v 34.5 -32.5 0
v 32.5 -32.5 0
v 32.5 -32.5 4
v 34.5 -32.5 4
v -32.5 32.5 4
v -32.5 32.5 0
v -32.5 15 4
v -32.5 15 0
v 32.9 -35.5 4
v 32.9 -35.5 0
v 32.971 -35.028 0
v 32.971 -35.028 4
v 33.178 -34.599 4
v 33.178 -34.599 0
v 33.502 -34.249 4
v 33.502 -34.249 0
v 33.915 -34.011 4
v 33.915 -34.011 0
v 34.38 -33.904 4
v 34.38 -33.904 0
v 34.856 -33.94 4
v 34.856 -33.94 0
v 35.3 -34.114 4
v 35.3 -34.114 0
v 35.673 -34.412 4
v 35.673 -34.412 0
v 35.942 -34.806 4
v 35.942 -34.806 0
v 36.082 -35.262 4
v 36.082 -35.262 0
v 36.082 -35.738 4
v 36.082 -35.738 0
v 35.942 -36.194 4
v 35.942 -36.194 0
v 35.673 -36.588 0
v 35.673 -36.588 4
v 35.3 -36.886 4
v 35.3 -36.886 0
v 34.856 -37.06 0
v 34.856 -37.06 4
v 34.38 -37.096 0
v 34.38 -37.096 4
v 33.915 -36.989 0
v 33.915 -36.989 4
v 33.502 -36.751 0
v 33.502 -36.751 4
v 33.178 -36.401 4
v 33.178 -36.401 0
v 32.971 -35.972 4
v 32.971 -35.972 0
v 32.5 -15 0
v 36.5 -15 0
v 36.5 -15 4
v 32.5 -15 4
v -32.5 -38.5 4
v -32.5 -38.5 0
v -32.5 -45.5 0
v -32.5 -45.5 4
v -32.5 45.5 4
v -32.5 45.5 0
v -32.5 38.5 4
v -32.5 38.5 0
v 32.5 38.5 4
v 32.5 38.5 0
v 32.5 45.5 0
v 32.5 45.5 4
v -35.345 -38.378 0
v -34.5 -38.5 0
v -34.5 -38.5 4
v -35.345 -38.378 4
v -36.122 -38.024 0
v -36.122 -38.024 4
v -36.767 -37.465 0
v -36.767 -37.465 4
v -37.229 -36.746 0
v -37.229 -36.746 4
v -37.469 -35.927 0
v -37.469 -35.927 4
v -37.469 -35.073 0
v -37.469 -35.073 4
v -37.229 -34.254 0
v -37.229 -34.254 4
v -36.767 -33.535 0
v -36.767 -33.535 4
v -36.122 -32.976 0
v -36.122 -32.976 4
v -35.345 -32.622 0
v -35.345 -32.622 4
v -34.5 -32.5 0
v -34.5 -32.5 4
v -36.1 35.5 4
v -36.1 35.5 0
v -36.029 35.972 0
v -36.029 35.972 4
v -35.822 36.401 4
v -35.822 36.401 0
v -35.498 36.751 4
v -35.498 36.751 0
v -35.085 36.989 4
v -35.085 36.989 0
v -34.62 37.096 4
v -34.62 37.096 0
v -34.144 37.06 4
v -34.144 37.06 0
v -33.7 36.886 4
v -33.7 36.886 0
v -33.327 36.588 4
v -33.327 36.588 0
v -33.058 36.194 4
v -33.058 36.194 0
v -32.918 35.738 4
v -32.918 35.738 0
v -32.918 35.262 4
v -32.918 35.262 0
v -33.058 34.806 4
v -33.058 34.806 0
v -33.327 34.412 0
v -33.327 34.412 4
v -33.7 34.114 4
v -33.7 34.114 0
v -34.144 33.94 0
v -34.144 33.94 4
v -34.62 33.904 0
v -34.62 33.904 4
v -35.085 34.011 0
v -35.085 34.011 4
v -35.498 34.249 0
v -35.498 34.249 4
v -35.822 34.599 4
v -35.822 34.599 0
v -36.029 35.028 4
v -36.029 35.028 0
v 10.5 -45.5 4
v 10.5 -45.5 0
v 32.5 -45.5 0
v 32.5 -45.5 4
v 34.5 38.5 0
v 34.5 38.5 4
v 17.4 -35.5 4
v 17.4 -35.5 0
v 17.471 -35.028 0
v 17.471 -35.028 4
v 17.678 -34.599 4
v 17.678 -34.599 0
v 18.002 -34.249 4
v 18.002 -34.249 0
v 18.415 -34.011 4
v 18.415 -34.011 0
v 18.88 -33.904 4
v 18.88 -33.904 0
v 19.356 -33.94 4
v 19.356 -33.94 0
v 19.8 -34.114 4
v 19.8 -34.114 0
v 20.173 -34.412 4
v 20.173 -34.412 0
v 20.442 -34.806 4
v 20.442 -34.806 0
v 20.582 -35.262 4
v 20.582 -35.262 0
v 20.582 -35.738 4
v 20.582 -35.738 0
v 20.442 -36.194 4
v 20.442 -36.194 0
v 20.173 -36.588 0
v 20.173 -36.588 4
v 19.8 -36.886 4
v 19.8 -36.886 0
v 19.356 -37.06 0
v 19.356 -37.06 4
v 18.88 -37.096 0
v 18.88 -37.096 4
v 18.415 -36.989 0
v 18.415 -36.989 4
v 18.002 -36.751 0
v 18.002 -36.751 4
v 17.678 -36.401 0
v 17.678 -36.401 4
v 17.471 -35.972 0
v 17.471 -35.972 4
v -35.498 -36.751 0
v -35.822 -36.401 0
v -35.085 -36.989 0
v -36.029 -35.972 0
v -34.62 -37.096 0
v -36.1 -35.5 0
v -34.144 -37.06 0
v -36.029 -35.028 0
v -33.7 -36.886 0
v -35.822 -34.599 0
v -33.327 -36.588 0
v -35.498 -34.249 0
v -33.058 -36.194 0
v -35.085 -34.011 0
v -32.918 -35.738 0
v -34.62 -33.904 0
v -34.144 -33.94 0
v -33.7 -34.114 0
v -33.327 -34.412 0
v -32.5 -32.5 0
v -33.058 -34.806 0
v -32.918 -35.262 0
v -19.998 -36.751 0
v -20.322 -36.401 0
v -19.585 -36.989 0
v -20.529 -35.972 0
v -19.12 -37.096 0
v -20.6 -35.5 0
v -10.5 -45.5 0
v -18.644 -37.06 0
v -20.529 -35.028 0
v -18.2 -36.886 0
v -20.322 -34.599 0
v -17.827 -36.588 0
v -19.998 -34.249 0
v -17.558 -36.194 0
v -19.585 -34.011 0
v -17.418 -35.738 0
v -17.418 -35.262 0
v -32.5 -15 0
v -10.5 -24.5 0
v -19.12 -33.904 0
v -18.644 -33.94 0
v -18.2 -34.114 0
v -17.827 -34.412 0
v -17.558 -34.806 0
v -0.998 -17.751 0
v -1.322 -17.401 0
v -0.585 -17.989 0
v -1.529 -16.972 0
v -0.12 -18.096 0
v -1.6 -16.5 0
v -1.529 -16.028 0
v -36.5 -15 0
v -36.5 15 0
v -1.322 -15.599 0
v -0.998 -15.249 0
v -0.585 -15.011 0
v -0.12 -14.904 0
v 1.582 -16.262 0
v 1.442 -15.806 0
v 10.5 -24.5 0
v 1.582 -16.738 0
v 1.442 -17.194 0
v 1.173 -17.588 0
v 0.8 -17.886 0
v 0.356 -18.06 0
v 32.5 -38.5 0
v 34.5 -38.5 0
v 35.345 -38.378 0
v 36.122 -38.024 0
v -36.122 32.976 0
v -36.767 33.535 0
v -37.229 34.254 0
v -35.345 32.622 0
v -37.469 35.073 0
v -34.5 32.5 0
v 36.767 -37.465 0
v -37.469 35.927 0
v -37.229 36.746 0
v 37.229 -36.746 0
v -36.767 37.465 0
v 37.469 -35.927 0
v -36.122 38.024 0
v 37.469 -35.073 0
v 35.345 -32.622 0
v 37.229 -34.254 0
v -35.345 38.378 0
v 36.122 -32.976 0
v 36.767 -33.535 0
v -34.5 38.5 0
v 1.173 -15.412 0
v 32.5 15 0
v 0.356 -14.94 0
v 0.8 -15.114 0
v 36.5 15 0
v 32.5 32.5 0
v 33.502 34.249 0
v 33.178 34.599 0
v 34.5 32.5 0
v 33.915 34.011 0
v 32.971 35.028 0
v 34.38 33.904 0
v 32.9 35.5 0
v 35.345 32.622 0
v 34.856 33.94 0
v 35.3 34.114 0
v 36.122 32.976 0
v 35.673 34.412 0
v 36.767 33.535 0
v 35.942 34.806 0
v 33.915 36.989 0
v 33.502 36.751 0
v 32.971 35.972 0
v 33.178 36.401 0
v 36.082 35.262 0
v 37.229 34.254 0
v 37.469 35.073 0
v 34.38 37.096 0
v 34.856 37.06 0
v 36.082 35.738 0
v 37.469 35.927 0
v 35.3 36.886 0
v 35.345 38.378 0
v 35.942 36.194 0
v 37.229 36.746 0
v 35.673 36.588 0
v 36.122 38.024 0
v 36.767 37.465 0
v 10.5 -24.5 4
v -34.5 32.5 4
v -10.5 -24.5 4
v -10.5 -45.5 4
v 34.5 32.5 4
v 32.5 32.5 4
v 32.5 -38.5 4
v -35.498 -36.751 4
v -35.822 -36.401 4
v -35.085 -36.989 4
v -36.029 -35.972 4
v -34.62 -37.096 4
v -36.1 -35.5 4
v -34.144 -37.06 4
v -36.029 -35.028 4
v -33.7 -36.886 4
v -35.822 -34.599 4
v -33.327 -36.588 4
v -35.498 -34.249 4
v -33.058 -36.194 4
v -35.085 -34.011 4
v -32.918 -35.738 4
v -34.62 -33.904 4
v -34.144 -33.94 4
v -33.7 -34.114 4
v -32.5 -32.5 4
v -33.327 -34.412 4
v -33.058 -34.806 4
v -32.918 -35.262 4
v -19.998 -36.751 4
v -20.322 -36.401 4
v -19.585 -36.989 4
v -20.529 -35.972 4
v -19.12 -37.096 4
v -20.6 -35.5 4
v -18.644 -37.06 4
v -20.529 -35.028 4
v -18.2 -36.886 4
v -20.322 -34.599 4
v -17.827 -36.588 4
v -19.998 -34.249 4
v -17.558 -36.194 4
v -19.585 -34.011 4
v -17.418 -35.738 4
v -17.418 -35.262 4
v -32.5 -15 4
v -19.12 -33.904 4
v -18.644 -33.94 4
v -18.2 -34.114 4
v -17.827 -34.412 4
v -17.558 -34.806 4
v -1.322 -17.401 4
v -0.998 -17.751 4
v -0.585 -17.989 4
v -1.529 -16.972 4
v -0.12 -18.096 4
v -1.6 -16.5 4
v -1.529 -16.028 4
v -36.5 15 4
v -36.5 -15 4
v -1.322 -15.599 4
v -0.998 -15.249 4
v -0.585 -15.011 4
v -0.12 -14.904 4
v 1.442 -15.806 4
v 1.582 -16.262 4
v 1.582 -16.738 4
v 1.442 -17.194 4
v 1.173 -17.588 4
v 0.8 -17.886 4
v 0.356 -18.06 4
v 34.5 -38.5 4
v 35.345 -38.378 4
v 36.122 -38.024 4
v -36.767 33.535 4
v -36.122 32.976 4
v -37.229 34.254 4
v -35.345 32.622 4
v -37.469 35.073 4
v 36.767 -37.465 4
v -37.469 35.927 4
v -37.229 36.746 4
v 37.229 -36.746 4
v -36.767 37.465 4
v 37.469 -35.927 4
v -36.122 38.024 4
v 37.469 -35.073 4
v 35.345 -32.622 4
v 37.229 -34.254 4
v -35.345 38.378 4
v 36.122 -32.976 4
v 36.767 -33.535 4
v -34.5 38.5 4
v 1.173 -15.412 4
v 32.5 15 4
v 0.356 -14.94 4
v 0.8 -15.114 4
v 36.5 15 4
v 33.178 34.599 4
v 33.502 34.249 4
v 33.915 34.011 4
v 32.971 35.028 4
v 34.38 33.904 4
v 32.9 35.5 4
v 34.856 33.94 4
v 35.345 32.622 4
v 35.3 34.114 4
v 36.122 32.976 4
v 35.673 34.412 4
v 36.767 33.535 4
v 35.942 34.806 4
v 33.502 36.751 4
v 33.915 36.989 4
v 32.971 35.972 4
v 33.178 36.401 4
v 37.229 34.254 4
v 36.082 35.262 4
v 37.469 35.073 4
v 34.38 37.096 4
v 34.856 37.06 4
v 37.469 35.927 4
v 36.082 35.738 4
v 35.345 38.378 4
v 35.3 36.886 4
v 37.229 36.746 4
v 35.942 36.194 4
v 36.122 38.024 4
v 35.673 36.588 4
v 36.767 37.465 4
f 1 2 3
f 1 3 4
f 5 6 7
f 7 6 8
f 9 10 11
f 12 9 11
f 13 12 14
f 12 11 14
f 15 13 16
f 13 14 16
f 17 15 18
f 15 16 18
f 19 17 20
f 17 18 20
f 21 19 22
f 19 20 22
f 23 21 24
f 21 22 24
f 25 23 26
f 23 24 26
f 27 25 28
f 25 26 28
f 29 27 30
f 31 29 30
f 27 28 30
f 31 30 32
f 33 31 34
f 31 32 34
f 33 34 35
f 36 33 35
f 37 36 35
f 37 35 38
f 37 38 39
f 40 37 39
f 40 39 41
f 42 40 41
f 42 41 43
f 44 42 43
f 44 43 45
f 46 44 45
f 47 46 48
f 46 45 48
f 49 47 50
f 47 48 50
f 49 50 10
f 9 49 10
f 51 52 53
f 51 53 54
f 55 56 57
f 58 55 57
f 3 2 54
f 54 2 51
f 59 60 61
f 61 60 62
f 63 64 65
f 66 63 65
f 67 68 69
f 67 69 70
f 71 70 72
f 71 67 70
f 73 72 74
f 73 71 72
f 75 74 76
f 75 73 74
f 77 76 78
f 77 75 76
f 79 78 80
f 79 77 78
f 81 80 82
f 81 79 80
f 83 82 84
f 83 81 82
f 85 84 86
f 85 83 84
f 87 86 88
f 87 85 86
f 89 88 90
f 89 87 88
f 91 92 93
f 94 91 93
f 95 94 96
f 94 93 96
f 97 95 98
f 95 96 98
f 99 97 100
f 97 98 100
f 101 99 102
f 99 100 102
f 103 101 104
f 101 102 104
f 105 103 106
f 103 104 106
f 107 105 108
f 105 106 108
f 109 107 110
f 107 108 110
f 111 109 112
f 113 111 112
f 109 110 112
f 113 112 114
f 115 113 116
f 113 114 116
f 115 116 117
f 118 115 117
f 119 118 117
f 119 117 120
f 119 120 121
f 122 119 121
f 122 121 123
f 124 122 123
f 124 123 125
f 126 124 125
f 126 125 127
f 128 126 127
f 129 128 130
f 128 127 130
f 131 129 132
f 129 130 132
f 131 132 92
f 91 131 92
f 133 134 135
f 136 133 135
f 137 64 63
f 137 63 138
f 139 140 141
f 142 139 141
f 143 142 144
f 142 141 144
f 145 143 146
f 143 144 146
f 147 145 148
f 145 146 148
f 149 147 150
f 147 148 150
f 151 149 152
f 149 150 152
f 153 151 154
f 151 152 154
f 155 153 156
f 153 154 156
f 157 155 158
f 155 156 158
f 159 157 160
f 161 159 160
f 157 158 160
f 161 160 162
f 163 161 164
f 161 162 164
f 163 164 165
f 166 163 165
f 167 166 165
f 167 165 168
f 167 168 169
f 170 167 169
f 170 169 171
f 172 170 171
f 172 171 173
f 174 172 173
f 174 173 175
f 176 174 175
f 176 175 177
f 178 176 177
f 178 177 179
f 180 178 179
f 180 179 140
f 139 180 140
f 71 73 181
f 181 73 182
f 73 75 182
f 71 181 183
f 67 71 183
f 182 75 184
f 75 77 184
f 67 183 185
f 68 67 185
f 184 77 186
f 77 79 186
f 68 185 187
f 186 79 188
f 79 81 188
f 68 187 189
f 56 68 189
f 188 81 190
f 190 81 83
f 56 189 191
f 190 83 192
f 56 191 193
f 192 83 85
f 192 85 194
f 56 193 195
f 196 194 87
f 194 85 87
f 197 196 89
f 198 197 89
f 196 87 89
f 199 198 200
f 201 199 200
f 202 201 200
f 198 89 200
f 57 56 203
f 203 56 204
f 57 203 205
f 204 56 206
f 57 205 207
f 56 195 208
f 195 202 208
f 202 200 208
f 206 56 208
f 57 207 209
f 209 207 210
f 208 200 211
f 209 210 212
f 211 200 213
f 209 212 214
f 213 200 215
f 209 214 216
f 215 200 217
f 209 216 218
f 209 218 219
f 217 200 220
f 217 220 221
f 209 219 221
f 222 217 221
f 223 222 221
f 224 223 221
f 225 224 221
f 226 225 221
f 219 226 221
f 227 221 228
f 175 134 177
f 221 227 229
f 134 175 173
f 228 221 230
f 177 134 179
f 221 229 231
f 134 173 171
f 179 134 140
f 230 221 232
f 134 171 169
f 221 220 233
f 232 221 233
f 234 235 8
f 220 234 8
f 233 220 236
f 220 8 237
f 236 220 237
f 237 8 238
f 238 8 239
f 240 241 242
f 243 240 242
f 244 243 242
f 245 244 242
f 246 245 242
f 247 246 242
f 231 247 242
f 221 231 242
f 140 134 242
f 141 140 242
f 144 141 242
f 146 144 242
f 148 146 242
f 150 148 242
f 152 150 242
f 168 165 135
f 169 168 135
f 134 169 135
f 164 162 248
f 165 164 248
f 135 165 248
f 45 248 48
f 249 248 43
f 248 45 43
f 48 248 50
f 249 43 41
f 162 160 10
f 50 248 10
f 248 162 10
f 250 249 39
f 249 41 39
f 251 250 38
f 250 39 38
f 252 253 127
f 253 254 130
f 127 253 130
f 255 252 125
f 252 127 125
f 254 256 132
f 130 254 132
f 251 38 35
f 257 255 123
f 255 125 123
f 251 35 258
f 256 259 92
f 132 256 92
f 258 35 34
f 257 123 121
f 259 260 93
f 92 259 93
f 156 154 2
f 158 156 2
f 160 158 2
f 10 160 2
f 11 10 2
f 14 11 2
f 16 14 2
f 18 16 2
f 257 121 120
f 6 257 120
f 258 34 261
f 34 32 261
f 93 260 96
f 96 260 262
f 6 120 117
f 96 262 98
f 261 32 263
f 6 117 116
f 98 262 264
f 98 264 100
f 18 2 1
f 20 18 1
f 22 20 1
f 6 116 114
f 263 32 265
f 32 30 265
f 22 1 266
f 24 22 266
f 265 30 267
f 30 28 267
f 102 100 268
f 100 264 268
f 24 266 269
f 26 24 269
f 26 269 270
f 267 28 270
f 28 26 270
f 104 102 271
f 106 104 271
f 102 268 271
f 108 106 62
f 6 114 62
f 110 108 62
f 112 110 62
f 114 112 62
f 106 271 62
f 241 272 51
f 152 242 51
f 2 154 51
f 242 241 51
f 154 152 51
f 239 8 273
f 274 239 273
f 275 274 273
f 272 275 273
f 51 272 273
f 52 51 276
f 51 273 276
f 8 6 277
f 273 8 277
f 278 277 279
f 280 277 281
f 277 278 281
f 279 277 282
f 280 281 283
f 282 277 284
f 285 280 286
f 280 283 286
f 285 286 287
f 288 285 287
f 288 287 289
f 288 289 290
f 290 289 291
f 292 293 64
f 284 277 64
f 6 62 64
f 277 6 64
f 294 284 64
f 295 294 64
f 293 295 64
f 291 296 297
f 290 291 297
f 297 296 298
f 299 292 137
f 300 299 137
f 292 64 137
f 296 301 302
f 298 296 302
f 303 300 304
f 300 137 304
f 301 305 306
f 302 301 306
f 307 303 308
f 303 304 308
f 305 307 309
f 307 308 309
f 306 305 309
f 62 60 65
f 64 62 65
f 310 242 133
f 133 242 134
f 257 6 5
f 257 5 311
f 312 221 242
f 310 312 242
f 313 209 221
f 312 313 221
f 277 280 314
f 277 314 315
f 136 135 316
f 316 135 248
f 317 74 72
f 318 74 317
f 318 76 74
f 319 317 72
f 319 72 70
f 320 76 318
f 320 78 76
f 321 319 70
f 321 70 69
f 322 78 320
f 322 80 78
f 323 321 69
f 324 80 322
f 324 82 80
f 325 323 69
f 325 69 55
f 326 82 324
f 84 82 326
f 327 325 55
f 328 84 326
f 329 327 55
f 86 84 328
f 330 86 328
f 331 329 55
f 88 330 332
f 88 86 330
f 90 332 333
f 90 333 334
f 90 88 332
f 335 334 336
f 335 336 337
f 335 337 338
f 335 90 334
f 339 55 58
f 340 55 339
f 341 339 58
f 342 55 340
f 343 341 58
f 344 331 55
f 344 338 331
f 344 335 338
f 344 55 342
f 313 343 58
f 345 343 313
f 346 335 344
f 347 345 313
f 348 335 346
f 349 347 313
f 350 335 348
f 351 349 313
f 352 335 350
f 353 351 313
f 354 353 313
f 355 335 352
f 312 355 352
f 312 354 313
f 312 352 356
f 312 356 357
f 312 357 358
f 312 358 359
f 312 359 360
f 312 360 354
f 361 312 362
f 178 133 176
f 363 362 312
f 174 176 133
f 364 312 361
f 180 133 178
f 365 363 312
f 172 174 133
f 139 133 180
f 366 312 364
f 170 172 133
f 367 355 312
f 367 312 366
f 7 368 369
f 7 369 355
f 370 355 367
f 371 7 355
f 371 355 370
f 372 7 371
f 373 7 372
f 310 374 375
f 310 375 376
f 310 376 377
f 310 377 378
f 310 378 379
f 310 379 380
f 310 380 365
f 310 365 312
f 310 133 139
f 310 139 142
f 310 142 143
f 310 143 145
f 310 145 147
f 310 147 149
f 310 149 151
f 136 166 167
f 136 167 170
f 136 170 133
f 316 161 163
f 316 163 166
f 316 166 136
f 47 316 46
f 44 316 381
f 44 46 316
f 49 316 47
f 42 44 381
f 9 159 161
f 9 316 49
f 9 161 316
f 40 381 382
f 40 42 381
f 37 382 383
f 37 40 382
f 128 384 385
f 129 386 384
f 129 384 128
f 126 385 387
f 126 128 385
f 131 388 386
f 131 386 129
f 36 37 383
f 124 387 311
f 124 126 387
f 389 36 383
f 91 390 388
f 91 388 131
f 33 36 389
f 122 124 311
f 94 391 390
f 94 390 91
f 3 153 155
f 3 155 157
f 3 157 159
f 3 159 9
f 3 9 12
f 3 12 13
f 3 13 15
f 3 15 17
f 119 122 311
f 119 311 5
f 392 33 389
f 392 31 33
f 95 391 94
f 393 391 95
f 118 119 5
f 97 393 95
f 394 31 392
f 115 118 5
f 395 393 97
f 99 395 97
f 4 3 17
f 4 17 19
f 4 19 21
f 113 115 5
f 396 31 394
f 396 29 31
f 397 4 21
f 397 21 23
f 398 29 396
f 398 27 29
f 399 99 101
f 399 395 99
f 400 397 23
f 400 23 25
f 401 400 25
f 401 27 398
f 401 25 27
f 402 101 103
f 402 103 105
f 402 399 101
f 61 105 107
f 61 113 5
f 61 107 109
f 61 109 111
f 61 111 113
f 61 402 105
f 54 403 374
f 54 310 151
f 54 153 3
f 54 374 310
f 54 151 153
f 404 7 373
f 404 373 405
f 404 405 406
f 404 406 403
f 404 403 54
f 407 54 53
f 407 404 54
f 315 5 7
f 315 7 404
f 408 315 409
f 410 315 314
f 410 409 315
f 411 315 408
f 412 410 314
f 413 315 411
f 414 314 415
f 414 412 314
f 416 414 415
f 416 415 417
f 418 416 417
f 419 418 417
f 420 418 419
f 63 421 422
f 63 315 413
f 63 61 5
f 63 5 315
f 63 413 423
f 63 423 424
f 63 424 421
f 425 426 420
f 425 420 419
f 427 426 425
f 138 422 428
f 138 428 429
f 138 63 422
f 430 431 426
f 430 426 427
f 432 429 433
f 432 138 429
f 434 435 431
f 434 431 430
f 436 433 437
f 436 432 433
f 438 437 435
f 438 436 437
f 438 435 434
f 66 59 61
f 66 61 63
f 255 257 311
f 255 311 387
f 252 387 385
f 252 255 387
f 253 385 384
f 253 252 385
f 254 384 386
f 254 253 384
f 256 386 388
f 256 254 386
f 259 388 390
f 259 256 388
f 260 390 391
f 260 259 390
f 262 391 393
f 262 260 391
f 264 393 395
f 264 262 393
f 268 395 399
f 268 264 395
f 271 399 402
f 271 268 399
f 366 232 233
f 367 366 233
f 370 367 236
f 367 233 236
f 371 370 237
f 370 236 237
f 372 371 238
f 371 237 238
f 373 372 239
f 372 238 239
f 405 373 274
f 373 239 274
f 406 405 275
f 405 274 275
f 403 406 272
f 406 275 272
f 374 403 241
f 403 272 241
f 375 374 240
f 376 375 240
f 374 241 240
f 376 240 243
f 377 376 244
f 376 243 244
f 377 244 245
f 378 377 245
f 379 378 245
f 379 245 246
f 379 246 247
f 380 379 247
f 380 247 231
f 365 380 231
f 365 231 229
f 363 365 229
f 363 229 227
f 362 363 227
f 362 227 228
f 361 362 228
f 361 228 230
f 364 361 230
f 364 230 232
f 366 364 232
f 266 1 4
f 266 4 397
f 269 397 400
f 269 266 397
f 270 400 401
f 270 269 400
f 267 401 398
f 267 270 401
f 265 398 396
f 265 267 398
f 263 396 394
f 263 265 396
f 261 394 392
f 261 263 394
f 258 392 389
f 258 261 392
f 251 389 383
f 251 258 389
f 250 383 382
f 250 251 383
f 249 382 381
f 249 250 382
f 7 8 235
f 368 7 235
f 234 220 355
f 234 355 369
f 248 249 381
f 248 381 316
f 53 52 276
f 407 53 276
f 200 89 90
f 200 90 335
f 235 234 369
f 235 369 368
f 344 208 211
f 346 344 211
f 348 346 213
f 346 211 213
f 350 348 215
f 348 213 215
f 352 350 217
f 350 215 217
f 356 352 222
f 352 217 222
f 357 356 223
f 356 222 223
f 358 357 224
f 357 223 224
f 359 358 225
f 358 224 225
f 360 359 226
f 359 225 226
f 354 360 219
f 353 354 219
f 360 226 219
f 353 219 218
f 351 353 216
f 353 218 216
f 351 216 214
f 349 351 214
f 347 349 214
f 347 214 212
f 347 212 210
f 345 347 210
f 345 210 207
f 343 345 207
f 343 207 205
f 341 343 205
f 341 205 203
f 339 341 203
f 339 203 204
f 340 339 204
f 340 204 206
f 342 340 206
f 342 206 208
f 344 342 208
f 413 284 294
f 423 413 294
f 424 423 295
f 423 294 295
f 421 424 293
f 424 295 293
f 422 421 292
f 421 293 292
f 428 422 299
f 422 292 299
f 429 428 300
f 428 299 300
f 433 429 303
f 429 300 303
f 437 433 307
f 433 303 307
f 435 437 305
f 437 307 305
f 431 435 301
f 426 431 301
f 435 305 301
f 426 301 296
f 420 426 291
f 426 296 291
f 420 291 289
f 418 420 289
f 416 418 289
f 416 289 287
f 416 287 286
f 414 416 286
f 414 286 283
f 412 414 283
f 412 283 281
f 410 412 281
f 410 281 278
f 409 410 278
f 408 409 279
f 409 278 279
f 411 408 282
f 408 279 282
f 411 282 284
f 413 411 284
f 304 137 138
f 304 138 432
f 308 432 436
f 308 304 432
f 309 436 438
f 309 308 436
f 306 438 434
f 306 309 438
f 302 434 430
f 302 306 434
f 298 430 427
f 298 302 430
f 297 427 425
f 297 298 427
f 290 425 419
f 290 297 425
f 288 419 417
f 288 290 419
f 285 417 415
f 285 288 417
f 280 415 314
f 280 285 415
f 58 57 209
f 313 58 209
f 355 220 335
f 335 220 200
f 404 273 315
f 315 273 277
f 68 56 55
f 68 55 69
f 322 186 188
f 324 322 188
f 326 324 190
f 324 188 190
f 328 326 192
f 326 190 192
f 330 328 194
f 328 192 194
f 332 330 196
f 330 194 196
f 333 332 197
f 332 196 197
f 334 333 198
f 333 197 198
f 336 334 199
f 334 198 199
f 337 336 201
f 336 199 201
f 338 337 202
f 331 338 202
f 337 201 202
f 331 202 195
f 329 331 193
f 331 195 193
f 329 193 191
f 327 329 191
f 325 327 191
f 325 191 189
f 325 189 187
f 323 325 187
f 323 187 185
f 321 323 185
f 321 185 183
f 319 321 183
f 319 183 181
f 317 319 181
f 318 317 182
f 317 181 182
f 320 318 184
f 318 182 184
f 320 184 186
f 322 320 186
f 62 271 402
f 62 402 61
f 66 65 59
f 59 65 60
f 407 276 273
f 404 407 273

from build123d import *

# Parameters (mm, degrees)
BOSS_EXTRUDE1_DEPTH = 4
SKETCH2_R           = 1.600000002
CUT_EXTRUDE1_DEPTH  = 57.058005673
SKETCH3_R           = 1.6
BOSS_EXTRUDE3_DEPTH = 4
SKETCH4_W           = 4
SKETCH4_H           = 30
BOSS_EXTRUDE4_DEPTH = 4


with BuildPart() as part:
    # Sketch1 → Boss-Extrude1 (new body)
    with BuildSketch(Plane.XY):
        Polygon((-10.5, -45.5), (-10.5, -24.5), (10.5, -24.5), (10.5, -45.5), (32.5, -45.5), (32.5, 45.5), (-32.5, 45.5), (-32.5, -45.5), align=None)
    extrude(amount=BOSS_EXTRUDE1_DEPTH)

    # Sketch2 → Cut-Extrude1 (cut, through all)
    with BuildSketch(Plane(origin=(0, 0, 0), x_dir=(-1, 0, 0), z_dir=(0, 0, -1))):
        with Locations((18.999999999, -35.500025949)):
            Circle(SKETCH2_R)
        with Locations((-1e-09, -16.500025949)):
            Circle(SKETCH2_R)
        with Locations((-19.000000001, -35.500025949)):
            Circle(SKETCH2_R)
    extrude(amount=-CUT_EXTRUDE1_DEPTH, mode=Mode.SUBTRACT)

    # Sketch3 → Boss-Extrude3 (add)
    # profile 1 of 4: a face of its own
    with BuildSketch(Plane(origin=(0, 0, 0), x_dir=(-1, 0, 0), z_dir=(0, 0, -1))):
        with BuildLine():
            Line((34.5, 38.5), (32.5, 38.5))
            Line((32.5, 38.5), (32.5, 32.5))
            Line((32.5, 32.5), (34.5, 32.5))
            ThreePointArc((34.5, 32.5), (37.5, 35.5), (34.5, 38.5))
        make_face()
        with Locations((34.5, 35.5)):
            Circle(SKETCH3_R, mode=Mode.SUBTRACT)
    # profile 2 of 4: a face of its own
    with BuildSketch(Plane(origin=(0, 0, 0), x_dir=(-1, 0, 0), z_dir=(0, 0, -1))):
        with BuildLine():
            Line((34.5, -32.5), (32.5, -32.5))
            Line((32.5, -32.5), (32.5, -38.5))
            Line((32.5, -38.5), (34.5, -38.5))
            ThreePointArc((34.5, -38.5), (37.5, -35.5), (34.5, -32.5))
        make_face()
        with Locations((34.5, -35.5)):
            Circle(SKETCH3_R, mode=Mode.SUBTRACT)
    # profile 3 of 4: a face of its own
    with BuildSketch(Plane(origin=(0, 0, 0), x_dir=(-1, 0, 0), z_dir=(0, 0, -1))):
        with BuildLine():
            Line((-34.5, -38.5), (-32.5, -38.5))
            Line((-32.5, -38.5), (-32.5, -32.5))
            Line((-32.5, -32.5), (-34.5, -32.5))
            ThreePointArc((-34.5, -32.5), (-37.5, -35.5), (-34.5, -38.5))
        make_face()
        with Locations((-34.5, -35.5)):
            Circle(SKETCH3_R, mode=Mode.SUBTRACT)
    # profile 4 of 4: a face of its own
    with BuildSketch(Plane(origin=(0, 0, 0), x_dir=(-1, 0, 0), z_dir=(0, 0, -1))):
        with BuildLine():
            Line((-34.5, 32.5), (-32.5, 32.5))
            Line((-32.5, 32.5), (-32.5, 38.5))
            Line((-32.5, 38.5), (-34.5, 38.5))
            ThreePointArc((-34.5, 38.5), (-37.5, 35.5), (-34.5, 32.5))
        make_face()
        with Locations((-34.5, 35.5)):
            Circle(SKETCH3_R, mode=Mode.SUBTRACT)
    extrude(amount=-BOSS_EXTRUDE3_DEPTH)

    # Sketch4 → Boss-Extrude4 (add)
    with BuildSketch(Plane(origin=(0, 0, 0), x_dir=(-1, 0, 0), z_dir=(0, 0, -1))):
        with Locations((34.5, 0)):
            Rectangle(SKETCH4_W, SKETCH4_H)
        with Locations((-34.5, 0)):
            Rectangle(SKETCH4_W, SKETCH4_H)
    extrude(amount=-BOSS_EXTRUDE4_DEPTH)


solid = part.part
